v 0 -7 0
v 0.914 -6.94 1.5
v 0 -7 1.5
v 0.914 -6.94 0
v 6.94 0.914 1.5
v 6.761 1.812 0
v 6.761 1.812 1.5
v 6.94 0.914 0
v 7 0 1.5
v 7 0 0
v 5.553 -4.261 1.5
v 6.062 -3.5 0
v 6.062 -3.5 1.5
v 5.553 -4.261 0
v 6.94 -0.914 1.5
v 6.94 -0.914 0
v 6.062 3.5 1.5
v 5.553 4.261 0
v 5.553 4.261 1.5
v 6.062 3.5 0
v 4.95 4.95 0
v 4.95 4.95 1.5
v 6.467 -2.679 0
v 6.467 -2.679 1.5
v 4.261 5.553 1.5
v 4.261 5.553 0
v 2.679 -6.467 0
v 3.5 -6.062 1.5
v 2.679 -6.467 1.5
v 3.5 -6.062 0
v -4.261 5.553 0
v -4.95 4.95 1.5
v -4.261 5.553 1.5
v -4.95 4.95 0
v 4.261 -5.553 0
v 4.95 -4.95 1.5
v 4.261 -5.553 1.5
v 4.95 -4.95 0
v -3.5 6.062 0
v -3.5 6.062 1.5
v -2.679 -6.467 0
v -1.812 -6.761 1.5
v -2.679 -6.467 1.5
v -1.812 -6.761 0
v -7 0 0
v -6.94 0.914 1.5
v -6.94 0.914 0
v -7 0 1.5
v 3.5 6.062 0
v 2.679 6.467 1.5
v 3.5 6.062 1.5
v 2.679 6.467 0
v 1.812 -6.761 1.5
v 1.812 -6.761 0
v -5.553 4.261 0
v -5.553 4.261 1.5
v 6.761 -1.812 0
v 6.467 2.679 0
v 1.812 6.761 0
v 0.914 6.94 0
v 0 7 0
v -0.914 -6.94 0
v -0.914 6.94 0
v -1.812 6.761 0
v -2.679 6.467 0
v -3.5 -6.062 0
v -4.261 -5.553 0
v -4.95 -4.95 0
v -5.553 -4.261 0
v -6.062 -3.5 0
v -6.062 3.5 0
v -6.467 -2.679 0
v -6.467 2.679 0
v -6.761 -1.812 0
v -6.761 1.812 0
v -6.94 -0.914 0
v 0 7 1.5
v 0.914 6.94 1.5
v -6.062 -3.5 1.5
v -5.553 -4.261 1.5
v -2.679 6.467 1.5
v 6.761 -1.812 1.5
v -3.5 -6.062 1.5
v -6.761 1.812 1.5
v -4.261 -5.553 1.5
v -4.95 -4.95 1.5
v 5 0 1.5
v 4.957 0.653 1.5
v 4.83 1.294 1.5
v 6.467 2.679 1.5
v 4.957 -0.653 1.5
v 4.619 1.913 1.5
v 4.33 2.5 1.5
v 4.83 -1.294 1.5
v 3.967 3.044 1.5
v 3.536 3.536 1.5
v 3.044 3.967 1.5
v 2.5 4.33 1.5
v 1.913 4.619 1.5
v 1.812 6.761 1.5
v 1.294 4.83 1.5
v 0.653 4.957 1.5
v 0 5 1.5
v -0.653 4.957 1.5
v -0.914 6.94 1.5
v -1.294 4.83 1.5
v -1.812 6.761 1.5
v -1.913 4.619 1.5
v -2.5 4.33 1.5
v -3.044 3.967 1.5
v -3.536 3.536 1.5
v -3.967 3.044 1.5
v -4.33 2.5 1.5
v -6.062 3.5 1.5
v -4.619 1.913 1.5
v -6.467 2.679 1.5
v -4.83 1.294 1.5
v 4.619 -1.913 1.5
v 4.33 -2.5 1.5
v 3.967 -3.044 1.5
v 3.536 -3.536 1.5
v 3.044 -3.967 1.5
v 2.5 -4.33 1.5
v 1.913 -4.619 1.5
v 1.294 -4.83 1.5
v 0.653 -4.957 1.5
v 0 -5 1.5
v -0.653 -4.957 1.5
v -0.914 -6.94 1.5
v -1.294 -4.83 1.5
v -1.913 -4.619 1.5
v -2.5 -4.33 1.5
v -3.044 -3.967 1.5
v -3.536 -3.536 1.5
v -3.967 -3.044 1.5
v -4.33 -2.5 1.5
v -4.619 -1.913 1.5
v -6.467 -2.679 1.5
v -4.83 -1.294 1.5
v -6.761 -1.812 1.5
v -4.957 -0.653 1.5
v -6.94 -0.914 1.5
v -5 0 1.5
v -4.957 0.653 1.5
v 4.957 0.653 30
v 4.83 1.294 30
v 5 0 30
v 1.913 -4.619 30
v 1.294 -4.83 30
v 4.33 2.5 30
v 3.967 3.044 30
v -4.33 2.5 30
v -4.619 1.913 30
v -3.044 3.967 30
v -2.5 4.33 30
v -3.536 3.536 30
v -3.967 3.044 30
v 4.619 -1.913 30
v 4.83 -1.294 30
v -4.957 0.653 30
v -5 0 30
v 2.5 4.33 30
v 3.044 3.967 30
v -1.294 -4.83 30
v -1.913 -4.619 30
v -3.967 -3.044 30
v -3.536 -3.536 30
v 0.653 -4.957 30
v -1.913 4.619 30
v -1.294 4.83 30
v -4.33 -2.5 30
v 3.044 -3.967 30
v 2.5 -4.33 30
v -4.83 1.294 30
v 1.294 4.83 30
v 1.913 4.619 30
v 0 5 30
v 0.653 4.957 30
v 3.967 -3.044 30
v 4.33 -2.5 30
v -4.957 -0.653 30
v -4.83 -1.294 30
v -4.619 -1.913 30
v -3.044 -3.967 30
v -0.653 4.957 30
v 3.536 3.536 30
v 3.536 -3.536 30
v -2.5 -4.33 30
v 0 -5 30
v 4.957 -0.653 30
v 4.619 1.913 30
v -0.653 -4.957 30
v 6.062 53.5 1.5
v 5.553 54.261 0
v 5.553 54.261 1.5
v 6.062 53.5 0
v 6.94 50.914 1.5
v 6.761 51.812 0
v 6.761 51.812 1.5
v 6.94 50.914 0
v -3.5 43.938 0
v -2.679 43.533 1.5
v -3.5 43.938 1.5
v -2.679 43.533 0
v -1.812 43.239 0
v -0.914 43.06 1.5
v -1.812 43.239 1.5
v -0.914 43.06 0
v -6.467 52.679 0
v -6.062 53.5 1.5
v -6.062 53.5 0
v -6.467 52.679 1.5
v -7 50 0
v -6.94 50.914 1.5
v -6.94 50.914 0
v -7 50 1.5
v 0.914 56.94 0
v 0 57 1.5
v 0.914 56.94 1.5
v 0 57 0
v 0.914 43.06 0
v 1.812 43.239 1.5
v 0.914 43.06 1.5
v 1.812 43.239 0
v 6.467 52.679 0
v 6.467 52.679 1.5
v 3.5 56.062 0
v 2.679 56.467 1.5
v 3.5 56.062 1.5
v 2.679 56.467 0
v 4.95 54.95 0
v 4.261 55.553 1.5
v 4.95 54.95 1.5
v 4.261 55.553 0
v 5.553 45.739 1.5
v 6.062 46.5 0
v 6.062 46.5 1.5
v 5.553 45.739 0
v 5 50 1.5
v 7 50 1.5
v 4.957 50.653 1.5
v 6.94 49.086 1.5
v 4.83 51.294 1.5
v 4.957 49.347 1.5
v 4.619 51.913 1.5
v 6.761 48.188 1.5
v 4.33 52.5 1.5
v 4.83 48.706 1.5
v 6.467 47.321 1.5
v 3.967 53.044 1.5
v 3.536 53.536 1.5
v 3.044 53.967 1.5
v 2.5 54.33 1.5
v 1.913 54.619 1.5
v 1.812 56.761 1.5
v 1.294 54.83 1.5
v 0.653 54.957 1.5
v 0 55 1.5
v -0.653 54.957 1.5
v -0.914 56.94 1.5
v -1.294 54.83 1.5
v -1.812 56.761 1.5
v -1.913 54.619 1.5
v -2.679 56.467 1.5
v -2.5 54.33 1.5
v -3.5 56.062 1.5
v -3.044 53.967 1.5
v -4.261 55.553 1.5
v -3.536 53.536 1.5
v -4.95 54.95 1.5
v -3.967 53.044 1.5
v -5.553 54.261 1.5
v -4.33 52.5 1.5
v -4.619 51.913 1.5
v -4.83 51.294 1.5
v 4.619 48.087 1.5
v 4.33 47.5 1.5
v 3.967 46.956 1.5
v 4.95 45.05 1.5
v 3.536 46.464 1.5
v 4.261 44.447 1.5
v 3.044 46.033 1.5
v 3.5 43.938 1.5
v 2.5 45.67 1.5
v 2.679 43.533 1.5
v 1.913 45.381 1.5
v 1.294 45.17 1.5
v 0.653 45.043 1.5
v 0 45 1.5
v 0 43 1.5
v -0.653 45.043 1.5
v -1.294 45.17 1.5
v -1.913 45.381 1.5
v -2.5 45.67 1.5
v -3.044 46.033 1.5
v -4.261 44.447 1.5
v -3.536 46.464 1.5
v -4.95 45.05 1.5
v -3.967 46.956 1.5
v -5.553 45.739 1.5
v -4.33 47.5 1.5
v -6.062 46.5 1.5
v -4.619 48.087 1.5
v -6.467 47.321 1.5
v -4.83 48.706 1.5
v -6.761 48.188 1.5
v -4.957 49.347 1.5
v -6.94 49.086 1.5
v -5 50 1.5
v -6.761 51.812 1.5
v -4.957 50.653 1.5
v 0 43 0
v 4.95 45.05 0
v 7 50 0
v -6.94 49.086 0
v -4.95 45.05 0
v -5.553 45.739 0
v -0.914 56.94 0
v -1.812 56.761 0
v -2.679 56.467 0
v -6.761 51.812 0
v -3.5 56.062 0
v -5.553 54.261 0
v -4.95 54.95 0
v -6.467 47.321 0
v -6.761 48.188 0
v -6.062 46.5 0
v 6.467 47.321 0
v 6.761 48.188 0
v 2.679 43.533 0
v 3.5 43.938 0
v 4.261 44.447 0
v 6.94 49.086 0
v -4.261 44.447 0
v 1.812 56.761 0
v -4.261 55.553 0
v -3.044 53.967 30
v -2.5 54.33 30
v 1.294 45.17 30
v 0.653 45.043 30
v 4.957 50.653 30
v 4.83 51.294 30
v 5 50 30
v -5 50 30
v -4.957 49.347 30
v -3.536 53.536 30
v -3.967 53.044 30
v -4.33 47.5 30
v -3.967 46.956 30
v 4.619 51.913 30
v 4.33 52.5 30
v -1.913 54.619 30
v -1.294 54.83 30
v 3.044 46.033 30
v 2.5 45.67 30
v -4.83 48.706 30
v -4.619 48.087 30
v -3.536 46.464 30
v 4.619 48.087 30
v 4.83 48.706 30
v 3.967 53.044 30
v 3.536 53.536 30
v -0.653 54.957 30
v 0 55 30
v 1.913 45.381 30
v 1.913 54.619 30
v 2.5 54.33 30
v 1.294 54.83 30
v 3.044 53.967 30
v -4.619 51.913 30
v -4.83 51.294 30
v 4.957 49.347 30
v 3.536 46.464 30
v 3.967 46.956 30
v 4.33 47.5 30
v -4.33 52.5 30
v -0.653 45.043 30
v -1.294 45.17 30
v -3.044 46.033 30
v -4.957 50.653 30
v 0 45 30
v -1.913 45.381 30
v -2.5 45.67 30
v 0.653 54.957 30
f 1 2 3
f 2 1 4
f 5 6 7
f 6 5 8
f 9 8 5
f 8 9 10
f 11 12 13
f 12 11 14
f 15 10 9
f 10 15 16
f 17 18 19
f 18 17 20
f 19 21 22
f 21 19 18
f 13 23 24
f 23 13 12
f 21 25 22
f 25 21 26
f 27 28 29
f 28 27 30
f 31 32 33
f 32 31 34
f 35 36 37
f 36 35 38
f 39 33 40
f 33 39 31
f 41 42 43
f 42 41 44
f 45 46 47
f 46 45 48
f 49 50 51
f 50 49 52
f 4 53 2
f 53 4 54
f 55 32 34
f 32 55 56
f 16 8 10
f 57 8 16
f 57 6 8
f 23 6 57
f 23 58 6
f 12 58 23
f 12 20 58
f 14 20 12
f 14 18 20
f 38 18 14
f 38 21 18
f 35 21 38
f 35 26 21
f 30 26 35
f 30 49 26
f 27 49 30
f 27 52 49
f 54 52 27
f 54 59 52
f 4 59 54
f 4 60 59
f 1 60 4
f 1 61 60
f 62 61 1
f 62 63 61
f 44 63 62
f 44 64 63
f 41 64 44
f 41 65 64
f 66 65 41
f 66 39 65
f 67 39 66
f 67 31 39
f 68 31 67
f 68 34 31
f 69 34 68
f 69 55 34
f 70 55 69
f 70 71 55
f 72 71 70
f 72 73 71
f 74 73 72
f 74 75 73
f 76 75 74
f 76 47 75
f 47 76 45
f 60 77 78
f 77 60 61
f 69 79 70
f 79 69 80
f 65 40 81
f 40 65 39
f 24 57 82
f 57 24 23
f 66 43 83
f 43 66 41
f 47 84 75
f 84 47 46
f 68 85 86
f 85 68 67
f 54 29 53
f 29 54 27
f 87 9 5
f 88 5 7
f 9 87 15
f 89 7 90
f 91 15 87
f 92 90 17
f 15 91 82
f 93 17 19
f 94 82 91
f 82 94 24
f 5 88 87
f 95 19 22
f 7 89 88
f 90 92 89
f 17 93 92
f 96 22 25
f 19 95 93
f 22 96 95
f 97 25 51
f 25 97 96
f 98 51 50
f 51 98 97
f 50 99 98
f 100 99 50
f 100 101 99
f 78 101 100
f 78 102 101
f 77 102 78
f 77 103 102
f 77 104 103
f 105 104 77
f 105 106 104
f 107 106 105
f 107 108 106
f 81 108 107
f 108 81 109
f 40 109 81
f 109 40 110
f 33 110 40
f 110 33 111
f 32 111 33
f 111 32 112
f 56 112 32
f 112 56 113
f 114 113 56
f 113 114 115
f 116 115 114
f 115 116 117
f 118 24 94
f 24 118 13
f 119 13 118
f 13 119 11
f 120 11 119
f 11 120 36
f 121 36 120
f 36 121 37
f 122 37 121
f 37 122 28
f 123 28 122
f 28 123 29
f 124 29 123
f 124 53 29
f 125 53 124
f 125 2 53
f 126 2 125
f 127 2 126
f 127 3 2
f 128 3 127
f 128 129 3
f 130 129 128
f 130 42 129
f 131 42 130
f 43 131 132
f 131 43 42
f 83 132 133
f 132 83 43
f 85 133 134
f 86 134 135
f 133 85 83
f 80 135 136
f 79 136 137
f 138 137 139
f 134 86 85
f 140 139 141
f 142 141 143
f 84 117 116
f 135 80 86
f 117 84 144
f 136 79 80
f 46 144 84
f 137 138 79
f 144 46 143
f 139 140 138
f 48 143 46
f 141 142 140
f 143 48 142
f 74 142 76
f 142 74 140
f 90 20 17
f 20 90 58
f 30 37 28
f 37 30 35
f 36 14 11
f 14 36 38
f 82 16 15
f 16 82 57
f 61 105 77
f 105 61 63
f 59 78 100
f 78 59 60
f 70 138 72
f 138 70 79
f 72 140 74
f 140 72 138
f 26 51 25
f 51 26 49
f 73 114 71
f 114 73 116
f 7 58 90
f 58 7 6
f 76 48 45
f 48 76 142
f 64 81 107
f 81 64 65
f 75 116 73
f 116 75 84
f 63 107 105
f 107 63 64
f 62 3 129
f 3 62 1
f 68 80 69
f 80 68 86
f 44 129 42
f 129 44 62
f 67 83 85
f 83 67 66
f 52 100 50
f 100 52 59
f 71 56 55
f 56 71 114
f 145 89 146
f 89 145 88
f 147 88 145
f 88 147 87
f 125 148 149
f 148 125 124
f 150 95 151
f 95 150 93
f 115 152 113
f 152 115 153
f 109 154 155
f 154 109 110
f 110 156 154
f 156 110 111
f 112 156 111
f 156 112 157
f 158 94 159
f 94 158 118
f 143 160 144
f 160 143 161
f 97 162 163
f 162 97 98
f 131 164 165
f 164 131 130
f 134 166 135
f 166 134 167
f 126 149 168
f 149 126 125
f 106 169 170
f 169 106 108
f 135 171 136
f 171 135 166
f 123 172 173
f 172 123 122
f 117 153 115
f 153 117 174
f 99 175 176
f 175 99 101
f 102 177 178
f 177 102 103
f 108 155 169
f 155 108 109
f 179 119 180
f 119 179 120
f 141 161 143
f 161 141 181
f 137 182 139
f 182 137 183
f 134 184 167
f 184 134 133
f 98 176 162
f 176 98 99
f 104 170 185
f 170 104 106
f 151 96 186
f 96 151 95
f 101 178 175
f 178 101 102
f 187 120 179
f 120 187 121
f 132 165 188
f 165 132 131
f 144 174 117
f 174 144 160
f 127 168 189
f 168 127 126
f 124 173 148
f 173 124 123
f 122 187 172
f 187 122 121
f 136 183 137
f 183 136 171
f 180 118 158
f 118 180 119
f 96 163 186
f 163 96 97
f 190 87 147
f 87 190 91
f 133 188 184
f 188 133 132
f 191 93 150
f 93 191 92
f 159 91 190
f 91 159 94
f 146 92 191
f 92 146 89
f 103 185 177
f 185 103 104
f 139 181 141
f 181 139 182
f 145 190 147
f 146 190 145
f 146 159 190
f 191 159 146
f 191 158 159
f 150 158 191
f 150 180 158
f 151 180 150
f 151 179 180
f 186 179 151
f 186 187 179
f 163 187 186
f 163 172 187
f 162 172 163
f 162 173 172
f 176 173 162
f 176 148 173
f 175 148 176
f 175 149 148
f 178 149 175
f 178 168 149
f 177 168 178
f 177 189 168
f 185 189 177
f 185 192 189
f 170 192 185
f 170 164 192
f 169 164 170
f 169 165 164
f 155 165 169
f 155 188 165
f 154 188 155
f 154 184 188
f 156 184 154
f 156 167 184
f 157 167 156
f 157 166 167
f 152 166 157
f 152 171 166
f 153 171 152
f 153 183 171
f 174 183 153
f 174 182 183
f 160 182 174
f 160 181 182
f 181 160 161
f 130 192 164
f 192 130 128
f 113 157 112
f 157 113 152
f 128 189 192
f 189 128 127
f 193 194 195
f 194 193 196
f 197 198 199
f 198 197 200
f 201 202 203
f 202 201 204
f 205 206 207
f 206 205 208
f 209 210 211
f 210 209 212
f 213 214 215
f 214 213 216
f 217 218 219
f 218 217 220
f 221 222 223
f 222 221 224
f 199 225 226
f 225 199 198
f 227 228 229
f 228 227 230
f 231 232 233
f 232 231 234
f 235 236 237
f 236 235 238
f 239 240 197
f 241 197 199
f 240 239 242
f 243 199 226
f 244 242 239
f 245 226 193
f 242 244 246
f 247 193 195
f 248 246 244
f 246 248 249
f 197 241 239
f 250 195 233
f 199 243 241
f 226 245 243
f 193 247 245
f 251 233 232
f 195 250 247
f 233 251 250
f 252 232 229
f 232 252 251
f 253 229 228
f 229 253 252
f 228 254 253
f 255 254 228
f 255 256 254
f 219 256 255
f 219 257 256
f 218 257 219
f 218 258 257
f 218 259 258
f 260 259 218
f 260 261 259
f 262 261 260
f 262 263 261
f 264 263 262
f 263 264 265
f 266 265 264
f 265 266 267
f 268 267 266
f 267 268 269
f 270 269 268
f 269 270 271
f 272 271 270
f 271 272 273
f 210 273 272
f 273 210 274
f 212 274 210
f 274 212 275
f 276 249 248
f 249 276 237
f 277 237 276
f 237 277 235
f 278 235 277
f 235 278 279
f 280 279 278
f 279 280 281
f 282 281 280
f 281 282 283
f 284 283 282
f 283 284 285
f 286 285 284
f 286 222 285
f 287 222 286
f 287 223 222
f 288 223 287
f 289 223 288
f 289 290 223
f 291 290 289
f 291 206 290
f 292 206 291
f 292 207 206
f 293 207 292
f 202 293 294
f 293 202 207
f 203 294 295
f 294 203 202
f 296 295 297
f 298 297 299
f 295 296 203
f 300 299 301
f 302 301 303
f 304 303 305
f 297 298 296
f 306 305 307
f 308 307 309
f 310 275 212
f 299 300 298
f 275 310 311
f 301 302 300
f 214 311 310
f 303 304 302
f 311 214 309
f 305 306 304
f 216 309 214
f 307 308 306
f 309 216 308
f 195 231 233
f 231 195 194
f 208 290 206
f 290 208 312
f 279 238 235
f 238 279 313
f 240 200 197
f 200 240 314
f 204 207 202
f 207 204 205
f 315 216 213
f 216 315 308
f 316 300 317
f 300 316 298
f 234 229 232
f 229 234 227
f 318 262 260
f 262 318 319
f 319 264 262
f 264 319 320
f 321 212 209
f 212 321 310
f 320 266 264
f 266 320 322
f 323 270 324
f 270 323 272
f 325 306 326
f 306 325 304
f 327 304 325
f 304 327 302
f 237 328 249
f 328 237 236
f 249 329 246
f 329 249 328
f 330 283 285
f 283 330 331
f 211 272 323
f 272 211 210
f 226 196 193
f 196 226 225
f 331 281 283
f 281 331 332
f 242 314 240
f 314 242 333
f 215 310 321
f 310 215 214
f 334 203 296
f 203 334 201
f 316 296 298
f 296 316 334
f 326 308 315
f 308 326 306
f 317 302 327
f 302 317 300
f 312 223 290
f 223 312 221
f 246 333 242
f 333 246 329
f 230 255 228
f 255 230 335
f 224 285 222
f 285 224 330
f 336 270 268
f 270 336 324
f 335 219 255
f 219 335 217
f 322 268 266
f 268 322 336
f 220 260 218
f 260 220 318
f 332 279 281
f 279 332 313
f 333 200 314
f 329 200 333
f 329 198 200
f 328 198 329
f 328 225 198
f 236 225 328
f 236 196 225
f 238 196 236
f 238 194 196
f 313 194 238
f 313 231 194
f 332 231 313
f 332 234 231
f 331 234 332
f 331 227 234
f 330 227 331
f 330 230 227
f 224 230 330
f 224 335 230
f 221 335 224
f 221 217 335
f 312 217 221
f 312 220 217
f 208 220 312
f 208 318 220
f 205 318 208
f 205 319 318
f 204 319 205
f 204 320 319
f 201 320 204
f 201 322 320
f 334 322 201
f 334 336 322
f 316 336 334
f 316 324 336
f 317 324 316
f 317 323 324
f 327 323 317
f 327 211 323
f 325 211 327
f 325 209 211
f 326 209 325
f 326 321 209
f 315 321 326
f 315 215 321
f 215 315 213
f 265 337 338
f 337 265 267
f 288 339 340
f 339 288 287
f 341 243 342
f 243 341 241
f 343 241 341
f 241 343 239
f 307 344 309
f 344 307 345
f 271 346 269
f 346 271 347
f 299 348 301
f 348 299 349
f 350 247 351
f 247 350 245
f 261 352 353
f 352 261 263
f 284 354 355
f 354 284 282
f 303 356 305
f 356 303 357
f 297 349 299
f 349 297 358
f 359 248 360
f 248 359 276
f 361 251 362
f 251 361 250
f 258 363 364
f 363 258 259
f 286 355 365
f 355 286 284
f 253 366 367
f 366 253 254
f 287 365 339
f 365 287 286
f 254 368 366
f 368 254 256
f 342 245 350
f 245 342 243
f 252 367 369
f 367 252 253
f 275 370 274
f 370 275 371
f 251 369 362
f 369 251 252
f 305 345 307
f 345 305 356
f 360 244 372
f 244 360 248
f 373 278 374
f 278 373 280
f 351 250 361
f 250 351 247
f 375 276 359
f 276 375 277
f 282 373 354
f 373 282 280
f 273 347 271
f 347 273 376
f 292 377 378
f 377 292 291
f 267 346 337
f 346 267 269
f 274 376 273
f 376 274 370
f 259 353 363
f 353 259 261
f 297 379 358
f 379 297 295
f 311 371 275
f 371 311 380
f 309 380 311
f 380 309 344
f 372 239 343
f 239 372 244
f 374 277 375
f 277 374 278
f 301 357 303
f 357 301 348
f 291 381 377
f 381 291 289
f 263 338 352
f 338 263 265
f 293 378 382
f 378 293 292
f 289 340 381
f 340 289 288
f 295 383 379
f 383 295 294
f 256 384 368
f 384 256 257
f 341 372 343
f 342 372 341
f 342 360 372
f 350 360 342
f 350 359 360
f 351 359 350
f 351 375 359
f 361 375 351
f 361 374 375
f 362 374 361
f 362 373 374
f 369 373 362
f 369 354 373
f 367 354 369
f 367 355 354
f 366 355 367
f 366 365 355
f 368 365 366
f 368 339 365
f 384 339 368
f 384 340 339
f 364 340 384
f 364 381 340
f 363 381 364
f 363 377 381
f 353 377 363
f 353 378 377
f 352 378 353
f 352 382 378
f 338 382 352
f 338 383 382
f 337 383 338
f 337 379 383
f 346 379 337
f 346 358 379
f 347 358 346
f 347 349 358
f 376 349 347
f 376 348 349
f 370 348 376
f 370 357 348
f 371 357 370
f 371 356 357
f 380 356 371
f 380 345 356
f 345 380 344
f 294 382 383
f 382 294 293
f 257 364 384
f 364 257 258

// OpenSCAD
/*
	stringing-tower — 双塔回缩 / 拉丝测试

	测什么
		两根 10 mm 直径、30 mm 高的圆柱，净距 40 mm。打印时喷嘴要在两塔
		之间空驶几十次，回缩（retraction）调得对不对，一眼就能看出来。

	怎么判读
		- 塔身之间干干净净 = 回缩量合适。
		- 细丝像蜘蛛网：回缩量不够 / 回缩速度太慢 / 温度太高。
		- 塔身上有疙瘩、缺料：回缩量过大（把熔料抽回热区），或回缩后补偿不足。
		- 只在一侧拉丝：喷嘴在空驶起点漏料，加"空驶前回缩"或抬 Z（Z-hop 0.2–0.4）。
		- 调参顺序：先降 5 °C 看拉丝是否减少 → 再动回缩量（每次 0.2 mm）。
		  温度的影响通常比回缩量更大。
		- 两根塔也顺便测"同层两次定位"：如果第二根塔的层纹和前一根错位，
		  说明 XY 定位或皮带松。

	期望值（默认参数）
		STL 体积 4.939 cm³，包围盒 14.00 × 64.00 × 30.00 mm，2 个独立实体，水密。
		塔心距 50 mm（净距 40 mm），贴床垫直径 14 mm。

	参数
		tower_d     塔直径 (mm)
		tower_h     塔高 (mm)
		gap         两塔净距 (mm)：越大空驶越久，拉丝越明显
		base_d      贴床垫直径 (mm)
		base_h      贴床垫高 (mm)
		fn          圆周分段数
*/

/* [塔] */
tower_d = 10;     // 塔直径 (mm)
tower_h = 30;     // 塔高 (mm)
gap = 40;         // 两塔净距 (mm)

/* [贴床垫] */
base_d = 14;      // 垫直径 (mm)：比塔粗，帮助粘床
base_h = 1.5;     // 垫高 (mm)

/* [网格] */
fn = 48;

assert(tower_d > 0 && tower_h > 0, "塔尺寸必须 > 0");
assert(base_d > tower_d, "base_d 必须大于 tower_d，否则垫片看不见");
assert(gap > 0, "gap 必须 > 0");

center_y = tower_d + gap;

module tower(y0) {
	// 垫片和塔同轴、从 z=0 起，靠体积相交连成一体
	translate([0, y0, 0]) cylinder(h = base_h, d = base_d, $fn = fn);
	translate([0, y0, 0]) cylinder(h = tower_h, d = tower_d, $fn = fn);
}

tower(0);
tower(center_y);
